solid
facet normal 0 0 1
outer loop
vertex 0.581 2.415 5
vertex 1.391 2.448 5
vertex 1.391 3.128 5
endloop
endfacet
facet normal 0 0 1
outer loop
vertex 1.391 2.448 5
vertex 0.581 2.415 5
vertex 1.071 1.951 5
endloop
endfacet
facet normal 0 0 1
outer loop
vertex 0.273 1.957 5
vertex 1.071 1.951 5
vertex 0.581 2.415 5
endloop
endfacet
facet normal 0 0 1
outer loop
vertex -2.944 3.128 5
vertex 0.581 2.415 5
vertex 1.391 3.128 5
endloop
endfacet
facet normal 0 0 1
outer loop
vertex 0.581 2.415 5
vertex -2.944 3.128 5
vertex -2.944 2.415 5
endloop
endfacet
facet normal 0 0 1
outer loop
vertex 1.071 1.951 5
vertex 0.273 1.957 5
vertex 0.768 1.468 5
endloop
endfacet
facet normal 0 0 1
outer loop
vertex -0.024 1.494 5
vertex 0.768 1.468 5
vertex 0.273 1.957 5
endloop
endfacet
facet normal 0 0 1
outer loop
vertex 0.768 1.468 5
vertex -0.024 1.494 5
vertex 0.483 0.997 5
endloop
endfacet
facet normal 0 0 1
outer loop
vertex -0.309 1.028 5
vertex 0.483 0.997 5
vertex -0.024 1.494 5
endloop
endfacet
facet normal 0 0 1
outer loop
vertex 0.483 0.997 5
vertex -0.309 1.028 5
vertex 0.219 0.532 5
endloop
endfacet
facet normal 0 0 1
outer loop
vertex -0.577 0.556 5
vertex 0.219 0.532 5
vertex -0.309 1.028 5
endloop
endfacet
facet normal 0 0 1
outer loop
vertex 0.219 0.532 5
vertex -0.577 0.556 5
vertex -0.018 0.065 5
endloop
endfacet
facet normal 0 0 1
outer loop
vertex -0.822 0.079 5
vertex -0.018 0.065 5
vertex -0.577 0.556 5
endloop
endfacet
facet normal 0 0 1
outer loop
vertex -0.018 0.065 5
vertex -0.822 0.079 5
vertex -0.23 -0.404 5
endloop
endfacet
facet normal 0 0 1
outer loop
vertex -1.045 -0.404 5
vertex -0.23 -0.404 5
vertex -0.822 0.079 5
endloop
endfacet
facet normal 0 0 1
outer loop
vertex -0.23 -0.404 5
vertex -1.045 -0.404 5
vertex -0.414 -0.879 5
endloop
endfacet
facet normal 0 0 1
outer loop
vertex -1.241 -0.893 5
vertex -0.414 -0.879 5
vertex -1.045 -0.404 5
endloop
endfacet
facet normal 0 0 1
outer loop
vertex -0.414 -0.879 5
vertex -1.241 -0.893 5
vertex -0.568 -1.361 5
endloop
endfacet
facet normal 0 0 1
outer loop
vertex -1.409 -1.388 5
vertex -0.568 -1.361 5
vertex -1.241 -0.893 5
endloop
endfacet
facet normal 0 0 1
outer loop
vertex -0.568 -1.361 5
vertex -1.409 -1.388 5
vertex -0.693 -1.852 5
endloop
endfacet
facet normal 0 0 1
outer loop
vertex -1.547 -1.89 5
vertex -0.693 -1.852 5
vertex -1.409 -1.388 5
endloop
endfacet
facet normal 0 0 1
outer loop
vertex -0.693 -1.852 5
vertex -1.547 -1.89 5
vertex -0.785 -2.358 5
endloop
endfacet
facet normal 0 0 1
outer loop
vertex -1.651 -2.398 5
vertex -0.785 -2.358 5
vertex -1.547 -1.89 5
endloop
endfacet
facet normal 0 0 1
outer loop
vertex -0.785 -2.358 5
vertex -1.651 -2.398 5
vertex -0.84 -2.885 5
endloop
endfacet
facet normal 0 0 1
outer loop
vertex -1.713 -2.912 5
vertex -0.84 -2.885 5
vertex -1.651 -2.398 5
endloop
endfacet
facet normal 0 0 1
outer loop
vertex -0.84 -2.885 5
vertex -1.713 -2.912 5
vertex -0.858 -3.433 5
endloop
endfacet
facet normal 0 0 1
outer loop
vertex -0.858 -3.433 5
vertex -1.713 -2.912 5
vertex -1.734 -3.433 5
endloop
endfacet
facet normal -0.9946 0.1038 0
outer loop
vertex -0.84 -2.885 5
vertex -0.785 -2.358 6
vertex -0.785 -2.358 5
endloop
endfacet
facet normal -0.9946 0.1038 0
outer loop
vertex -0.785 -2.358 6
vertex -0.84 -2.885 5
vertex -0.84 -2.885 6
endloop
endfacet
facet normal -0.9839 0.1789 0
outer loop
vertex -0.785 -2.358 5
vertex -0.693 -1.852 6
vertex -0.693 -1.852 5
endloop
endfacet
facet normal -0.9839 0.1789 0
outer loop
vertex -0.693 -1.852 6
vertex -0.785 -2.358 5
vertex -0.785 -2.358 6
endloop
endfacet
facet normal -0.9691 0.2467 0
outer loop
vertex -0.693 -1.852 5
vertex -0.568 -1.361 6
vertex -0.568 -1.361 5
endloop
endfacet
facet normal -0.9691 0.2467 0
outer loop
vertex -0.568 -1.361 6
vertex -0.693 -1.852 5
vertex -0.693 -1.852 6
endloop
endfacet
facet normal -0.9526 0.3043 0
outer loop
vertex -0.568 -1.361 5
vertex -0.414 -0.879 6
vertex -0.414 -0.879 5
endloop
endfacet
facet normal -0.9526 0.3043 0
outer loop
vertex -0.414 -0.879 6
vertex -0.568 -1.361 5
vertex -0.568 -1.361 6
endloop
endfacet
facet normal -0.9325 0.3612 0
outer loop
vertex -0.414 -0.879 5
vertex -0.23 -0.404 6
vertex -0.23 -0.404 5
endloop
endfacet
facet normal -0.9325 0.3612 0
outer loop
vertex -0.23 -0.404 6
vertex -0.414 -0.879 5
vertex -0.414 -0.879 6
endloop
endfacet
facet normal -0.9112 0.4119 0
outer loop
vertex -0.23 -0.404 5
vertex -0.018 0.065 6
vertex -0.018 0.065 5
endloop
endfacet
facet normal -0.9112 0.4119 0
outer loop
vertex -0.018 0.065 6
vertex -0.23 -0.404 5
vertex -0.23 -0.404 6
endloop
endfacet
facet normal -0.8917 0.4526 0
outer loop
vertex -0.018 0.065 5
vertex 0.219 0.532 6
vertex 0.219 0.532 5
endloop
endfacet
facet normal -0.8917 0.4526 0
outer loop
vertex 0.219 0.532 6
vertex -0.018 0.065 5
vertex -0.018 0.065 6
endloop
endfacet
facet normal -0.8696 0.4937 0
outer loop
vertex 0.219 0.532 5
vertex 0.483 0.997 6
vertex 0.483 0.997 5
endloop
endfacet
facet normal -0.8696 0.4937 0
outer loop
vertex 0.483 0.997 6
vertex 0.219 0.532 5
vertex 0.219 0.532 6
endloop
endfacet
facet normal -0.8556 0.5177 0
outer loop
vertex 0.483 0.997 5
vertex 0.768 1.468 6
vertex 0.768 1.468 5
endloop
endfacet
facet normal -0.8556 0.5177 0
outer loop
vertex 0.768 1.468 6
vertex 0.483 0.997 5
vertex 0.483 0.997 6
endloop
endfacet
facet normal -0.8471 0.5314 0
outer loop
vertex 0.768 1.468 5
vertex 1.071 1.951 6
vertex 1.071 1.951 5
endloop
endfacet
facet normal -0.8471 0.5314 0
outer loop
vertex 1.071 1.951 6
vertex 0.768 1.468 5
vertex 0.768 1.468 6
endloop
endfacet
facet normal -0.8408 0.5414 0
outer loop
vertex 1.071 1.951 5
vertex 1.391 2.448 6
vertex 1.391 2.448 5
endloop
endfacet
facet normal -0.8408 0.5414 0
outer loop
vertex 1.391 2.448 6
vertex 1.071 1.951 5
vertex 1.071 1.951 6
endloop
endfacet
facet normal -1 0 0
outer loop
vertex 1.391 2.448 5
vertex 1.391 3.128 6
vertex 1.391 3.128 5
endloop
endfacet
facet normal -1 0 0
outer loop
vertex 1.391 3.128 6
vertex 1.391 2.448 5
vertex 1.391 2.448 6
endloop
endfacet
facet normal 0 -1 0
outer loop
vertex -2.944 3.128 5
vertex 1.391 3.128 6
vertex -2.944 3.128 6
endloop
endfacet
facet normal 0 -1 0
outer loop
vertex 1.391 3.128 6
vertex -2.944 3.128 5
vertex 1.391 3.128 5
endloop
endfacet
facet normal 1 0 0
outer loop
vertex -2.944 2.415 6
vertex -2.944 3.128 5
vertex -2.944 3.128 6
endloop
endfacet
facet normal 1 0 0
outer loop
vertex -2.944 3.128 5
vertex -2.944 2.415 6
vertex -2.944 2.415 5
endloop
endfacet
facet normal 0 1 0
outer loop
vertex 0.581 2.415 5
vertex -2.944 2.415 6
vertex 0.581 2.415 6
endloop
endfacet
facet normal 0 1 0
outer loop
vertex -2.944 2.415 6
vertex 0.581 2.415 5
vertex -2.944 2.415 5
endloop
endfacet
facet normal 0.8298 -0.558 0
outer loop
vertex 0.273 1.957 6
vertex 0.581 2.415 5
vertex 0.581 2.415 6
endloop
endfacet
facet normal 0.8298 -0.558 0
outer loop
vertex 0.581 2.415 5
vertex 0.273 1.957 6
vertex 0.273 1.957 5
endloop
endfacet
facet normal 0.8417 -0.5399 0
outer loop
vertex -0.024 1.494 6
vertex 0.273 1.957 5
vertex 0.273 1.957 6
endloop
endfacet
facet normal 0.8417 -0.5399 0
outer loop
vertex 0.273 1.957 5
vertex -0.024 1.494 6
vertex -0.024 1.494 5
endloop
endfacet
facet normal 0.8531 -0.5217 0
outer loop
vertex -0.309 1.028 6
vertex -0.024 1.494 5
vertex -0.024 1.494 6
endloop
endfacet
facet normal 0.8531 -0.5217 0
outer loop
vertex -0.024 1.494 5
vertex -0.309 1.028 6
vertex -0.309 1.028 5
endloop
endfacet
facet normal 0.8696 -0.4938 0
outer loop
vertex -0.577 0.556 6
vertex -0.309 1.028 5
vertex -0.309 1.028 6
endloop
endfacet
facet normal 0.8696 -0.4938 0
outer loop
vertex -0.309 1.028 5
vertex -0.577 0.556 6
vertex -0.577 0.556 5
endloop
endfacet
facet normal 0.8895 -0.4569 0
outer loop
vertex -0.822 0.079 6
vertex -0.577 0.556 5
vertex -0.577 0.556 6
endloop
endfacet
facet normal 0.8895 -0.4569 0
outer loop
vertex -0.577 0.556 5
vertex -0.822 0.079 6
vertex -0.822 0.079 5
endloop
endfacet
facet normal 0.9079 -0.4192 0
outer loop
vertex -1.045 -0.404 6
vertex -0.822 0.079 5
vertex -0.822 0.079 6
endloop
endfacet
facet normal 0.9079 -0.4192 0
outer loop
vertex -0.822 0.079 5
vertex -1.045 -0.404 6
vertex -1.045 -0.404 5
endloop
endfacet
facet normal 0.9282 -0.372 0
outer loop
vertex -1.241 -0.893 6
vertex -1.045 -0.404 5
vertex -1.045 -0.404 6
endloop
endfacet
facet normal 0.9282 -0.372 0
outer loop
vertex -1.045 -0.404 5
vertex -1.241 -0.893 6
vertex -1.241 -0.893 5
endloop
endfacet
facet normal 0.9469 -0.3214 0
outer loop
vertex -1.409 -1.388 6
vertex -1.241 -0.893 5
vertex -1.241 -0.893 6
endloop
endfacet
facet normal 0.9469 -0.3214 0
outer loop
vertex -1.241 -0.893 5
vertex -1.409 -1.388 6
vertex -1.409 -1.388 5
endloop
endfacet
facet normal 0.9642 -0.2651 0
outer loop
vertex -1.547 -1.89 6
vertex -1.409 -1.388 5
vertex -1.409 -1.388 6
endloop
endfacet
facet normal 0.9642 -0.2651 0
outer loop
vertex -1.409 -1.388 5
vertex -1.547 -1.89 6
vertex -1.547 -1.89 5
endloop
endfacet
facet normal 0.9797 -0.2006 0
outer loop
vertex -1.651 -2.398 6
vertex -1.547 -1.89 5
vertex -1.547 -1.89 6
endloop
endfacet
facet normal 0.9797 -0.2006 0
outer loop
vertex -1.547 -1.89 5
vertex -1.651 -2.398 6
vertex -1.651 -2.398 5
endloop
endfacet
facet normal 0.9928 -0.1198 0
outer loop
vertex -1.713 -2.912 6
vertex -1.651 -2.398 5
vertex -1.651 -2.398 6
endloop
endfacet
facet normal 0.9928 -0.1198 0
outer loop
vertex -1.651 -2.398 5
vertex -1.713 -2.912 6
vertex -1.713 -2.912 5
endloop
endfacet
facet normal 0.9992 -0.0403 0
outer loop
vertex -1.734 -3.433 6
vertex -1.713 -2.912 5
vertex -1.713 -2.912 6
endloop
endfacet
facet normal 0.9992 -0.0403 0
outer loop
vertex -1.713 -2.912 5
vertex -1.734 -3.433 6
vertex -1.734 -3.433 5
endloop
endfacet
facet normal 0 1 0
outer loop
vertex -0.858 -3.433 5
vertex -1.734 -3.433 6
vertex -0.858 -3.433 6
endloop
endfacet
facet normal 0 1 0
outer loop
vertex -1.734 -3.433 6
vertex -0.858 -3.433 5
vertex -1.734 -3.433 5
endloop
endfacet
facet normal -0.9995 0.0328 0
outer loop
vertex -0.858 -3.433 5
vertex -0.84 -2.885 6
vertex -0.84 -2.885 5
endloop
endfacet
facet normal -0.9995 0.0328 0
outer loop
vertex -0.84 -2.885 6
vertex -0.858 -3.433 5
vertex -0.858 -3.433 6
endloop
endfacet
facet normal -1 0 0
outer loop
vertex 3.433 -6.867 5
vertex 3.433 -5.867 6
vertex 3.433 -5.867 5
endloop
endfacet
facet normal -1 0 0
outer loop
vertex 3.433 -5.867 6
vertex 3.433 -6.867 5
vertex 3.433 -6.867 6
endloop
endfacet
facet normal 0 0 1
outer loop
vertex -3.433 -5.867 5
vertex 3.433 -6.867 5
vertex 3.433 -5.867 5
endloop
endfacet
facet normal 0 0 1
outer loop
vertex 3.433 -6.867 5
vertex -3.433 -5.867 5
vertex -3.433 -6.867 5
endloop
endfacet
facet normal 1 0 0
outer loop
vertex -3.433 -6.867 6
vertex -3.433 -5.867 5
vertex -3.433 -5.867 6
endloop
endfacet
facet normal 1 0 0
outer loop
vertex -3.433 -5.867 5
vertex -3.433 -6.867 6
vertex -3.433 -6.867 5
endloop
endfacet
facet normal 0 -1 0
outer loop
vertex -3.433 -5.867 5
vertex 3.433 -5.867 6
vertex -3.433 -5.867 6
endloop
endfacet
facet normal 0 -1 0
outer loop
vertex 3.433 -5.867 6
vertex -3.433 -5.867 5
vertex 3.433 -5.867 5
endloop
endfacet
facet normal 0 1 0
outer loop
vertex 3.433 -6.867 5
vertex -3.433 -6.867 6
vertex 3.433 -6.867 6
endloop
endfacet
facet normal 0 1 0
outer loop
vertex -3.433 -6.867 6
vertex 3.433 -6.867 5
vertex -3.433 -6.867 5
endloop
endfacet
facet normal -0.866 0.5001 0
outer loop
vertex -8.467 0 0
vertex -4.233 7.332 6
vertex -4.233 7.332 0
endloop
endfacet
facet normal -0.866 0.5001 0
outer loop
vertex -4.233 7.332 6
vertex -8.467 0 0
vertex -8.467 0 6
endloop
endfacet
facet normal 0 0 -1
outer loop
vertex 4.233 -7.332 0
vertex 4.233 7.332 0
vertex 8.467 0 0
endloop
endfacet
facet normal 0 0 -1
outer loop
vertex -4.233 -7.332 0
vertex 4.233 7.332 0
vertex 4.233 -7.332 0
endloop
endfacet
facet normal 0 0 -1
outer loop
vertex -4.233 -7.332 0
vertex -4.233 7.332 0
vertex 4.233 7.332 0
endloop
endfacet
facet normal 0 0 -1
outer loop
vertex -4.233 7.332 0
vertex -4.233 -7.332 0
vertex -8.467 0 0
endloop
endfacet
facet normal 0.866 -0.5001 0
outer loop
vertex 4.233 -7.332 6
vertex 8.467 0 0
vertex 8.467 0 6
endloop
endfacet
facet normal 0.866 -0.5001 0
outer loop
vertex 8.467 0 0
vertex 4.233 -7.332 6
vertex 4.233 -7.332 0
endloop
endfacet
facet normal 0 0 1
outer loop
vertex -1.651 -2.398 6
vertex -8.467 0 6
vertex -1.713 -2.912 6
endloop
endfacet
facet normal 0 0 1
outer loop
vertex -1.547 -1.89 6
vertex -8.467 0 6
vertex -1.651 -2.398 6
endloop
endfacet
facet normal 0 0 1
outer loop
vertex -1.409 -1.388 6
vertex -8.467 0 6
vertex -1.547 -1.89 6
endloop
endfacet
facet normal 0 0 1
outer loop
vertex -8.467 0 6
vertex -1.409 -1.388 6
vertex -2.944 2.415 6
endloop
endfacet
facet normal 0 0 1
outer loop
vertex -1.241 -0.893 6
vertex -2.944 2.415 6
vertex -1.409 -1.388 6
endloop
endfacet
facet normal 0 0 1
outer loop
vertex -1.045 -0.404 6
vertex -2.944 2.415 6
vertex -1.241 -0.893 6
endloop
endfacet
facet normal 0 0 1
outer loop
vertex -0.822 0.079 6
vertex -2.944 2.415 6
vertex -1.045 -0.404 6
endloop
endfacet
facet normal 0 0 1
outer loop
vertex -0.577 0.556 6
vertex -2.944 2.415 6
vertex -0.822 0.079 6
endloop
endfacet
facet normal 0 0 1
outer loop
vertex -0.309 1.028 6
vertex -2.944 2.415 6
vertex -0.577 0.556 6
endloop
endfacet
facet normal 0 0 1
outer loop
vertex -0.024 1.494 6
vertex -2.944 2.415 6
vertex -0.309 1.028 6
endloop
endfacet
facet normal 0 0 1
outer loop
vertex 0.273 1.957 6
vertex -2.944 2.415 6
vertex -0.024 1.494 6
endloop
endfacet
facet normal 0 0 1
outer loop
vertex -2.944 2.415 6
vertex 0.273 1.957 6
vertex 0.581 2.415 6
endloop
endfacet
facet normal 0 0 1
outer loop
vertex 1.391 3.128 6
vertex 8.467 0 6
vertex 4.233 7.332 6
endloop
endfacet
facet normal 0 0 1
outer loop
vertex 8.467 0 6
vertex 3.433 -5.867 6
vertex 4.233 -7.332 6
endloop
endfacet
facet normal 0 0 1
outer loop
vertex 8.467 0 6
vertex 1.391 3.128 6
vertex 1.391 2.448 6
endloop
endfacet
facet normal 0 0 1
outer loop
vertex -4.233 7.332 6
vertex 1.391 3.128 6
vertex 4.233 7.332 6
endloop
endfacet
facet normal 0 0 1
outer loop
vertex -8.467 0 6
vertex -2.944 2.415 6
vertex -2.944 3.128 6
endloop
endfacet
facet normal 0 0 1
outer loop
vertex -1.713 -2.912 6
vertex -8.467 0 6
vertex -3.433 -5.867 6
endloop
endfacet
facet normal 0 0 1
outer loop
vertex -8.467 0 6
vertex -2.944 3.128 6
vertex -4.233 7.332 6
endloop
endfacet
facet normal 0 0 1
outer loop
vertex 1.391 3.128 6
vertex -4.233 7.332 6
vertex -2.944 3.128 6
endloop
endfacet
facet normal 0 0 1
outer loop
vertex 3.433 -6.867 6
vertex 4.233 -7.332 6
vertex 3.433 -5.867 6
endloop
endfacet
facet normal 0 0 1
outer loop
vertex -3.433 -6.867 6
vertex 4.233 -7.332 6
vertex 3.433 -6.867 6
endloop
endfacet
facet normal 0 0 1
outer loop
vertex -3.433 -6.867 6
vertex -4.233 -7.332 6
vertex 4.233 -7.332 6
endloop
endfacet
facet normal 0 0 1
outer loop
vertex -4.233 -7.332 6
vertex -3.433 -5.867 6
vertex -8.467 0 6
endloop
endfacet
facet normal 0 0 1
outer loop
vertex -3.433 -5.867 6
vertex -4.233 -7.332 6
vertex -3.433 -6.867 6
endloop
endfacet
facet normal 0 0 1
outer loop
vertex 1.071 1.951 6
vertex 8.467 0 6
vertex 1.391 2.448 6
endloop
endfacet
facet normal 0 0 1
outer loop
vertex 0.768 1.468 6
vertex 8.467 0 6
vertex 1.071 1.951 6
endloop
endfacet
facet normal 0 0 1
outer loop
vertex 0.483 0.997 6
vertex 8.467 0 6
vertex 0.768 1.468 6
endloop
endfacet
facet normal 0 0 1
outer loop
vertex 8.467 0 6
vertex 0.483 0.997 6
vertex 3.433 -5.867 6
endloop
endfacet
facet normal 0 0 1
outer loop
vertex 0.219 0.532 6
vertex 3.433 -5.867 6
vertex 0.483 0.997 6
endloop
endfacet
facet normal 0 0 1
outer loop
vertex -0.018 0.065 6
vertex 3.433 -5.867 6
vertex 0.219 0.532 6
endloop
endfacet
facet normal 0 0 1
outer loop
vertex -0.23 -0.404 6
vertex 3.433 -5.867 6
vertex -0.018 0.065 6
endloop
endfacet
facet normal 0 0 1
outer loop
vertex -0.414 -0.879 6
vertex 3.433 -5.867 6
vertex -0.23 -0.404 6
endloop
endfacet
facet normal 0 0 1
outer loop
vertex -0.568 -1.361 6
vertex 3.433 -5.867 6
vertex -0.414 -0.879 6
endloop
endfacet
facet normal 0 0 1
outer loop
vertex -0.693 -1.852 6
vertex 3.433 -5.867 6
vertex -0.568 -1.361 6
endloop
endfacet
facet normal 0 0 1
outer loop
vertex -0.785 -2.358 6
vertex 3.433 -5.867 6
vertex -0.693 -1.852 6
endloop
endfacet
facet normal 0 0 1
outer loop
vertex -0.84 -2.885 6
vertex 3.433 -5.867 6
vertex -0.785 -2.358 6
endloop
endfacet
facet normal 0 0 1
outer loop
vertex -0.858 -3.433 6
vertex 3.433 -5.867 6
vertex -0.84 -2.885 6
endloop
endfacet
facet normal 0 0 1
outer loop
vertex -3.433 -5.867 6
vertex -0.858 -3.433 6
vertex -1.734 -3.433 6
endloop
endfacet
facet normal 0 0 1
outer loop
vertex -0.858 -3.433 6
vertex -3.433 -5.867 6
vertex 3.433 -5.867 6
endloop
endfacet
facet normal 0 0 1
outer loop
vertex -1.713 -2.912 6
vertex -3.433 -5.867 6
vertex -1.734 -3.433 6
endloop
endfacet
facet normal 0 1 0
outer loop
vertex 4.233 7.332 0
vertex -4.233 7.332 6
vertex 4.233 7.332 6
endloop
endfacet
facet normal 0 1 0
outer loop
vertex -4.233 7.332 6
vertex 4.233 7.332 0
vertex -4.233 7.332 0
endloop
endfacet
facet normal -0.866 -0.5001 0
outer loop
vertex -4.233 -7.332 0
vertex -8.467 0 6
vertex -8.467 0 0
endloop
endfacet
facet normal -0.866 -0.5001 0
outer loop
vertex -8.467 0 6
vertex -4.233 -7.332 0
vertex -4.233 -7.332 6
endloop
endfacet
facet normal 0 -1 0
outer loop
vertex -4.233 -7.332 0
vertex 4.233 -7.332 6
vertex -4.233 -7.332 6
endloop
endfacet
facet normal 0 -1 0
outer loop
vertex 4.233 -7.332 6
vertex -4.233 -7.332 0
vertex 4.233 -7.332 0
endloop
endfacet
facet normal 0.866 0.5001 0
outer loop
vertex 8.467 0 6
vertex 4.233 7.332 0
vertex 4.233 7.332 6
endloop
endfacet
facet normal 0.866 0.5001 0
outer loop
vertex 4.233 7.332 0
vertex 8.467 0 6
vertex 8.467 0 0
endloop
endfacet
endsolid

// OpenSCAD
// file: ../library/calculate.scad
module inlay(depth)
{
    difference()
    {
        children(0);
        translate([ 0, 0, depth ]) children([1:$children - 1]);
    }
}
// file: ../library/variables.scad
// Variables

die_width = 12;
double_digit_placement = 1; // 0.7 for 8mm, 1 for 12mm

wiggle_width = 0.2;
separator = 1.6;
base_plate_sides = 5;
token_sides = 6;
slot_height = 1;

// Calculations

height = die_width / 2;

die_slot_width = die_width + wiggle_width;
die_slot_y = -1 * ((die_slot_width / 2) + separator);
die_slot_right_x = (die_slot_width / 2) + separator;
die_slot_left_x = -1 * (die_slot_width / 2) - separator;

base_plate_size = (die_slot_width * 2) + separator;
inset_width = base_plate_size - separator;
inset_depth = height - separator;

shallow_slot_height = (height - inset_depth) / 2;

token_slot_width = base_plate_size / 3;
token_width = token_slot_width - wiggle_width;
token_height = height;
token_slot_y = (die_slot_width / 2) + (separator * 2);
token_inset_height = token_height - 1;
token_doubledigit_font_size = token_width - separator;

token_poison_width = (token_width / 3);
token_poison_placement = (token_width / 3);
// file: ../library/tokens.scad
include <variables.scad>
include <calculate.scad>

module token_base()
{
    linear_extrude(token_height) circle(token_width, $fn = token_sides);
}

module token_doubledigit_number(num) 
{
    inlay(depth = token_inset_height) 
    {
        token_base();
        translate([-1 * token_doubledigit_font_size + double_digit_placement, -1 * token_doubledigit_font_size / 2, 0]) linear_extrude(token_height) text(text = num, size = token_doubledigit_font_size);
        translate([-1 * token_doubledigit_font_size / 2, -1 * token_doubledigit_font_size, 0]) cube([token_doubledigit_font_size, 1, 2]);
    }
}

module token_singledigit_number(num) 
{ 
    inlay(depth = token_inset_height) 
    {
        token_base();
        translate([-1 * (token_doubledigit_font_size / 2), -1 * token_doubledigit_font_size / 2, 0]) linear_extrude(token_height) text(text = num, size = token_doubledigit_font_size);
        translate([-1 * token_doubledigit_font_size / 2, -1 * token_doubledigit_font_size, 0]) cube([token_doubledigit_font_size, 1, 2]);
    }
}
// main file
include <../library/tokens.scad>

token_singledigit_number("7");
